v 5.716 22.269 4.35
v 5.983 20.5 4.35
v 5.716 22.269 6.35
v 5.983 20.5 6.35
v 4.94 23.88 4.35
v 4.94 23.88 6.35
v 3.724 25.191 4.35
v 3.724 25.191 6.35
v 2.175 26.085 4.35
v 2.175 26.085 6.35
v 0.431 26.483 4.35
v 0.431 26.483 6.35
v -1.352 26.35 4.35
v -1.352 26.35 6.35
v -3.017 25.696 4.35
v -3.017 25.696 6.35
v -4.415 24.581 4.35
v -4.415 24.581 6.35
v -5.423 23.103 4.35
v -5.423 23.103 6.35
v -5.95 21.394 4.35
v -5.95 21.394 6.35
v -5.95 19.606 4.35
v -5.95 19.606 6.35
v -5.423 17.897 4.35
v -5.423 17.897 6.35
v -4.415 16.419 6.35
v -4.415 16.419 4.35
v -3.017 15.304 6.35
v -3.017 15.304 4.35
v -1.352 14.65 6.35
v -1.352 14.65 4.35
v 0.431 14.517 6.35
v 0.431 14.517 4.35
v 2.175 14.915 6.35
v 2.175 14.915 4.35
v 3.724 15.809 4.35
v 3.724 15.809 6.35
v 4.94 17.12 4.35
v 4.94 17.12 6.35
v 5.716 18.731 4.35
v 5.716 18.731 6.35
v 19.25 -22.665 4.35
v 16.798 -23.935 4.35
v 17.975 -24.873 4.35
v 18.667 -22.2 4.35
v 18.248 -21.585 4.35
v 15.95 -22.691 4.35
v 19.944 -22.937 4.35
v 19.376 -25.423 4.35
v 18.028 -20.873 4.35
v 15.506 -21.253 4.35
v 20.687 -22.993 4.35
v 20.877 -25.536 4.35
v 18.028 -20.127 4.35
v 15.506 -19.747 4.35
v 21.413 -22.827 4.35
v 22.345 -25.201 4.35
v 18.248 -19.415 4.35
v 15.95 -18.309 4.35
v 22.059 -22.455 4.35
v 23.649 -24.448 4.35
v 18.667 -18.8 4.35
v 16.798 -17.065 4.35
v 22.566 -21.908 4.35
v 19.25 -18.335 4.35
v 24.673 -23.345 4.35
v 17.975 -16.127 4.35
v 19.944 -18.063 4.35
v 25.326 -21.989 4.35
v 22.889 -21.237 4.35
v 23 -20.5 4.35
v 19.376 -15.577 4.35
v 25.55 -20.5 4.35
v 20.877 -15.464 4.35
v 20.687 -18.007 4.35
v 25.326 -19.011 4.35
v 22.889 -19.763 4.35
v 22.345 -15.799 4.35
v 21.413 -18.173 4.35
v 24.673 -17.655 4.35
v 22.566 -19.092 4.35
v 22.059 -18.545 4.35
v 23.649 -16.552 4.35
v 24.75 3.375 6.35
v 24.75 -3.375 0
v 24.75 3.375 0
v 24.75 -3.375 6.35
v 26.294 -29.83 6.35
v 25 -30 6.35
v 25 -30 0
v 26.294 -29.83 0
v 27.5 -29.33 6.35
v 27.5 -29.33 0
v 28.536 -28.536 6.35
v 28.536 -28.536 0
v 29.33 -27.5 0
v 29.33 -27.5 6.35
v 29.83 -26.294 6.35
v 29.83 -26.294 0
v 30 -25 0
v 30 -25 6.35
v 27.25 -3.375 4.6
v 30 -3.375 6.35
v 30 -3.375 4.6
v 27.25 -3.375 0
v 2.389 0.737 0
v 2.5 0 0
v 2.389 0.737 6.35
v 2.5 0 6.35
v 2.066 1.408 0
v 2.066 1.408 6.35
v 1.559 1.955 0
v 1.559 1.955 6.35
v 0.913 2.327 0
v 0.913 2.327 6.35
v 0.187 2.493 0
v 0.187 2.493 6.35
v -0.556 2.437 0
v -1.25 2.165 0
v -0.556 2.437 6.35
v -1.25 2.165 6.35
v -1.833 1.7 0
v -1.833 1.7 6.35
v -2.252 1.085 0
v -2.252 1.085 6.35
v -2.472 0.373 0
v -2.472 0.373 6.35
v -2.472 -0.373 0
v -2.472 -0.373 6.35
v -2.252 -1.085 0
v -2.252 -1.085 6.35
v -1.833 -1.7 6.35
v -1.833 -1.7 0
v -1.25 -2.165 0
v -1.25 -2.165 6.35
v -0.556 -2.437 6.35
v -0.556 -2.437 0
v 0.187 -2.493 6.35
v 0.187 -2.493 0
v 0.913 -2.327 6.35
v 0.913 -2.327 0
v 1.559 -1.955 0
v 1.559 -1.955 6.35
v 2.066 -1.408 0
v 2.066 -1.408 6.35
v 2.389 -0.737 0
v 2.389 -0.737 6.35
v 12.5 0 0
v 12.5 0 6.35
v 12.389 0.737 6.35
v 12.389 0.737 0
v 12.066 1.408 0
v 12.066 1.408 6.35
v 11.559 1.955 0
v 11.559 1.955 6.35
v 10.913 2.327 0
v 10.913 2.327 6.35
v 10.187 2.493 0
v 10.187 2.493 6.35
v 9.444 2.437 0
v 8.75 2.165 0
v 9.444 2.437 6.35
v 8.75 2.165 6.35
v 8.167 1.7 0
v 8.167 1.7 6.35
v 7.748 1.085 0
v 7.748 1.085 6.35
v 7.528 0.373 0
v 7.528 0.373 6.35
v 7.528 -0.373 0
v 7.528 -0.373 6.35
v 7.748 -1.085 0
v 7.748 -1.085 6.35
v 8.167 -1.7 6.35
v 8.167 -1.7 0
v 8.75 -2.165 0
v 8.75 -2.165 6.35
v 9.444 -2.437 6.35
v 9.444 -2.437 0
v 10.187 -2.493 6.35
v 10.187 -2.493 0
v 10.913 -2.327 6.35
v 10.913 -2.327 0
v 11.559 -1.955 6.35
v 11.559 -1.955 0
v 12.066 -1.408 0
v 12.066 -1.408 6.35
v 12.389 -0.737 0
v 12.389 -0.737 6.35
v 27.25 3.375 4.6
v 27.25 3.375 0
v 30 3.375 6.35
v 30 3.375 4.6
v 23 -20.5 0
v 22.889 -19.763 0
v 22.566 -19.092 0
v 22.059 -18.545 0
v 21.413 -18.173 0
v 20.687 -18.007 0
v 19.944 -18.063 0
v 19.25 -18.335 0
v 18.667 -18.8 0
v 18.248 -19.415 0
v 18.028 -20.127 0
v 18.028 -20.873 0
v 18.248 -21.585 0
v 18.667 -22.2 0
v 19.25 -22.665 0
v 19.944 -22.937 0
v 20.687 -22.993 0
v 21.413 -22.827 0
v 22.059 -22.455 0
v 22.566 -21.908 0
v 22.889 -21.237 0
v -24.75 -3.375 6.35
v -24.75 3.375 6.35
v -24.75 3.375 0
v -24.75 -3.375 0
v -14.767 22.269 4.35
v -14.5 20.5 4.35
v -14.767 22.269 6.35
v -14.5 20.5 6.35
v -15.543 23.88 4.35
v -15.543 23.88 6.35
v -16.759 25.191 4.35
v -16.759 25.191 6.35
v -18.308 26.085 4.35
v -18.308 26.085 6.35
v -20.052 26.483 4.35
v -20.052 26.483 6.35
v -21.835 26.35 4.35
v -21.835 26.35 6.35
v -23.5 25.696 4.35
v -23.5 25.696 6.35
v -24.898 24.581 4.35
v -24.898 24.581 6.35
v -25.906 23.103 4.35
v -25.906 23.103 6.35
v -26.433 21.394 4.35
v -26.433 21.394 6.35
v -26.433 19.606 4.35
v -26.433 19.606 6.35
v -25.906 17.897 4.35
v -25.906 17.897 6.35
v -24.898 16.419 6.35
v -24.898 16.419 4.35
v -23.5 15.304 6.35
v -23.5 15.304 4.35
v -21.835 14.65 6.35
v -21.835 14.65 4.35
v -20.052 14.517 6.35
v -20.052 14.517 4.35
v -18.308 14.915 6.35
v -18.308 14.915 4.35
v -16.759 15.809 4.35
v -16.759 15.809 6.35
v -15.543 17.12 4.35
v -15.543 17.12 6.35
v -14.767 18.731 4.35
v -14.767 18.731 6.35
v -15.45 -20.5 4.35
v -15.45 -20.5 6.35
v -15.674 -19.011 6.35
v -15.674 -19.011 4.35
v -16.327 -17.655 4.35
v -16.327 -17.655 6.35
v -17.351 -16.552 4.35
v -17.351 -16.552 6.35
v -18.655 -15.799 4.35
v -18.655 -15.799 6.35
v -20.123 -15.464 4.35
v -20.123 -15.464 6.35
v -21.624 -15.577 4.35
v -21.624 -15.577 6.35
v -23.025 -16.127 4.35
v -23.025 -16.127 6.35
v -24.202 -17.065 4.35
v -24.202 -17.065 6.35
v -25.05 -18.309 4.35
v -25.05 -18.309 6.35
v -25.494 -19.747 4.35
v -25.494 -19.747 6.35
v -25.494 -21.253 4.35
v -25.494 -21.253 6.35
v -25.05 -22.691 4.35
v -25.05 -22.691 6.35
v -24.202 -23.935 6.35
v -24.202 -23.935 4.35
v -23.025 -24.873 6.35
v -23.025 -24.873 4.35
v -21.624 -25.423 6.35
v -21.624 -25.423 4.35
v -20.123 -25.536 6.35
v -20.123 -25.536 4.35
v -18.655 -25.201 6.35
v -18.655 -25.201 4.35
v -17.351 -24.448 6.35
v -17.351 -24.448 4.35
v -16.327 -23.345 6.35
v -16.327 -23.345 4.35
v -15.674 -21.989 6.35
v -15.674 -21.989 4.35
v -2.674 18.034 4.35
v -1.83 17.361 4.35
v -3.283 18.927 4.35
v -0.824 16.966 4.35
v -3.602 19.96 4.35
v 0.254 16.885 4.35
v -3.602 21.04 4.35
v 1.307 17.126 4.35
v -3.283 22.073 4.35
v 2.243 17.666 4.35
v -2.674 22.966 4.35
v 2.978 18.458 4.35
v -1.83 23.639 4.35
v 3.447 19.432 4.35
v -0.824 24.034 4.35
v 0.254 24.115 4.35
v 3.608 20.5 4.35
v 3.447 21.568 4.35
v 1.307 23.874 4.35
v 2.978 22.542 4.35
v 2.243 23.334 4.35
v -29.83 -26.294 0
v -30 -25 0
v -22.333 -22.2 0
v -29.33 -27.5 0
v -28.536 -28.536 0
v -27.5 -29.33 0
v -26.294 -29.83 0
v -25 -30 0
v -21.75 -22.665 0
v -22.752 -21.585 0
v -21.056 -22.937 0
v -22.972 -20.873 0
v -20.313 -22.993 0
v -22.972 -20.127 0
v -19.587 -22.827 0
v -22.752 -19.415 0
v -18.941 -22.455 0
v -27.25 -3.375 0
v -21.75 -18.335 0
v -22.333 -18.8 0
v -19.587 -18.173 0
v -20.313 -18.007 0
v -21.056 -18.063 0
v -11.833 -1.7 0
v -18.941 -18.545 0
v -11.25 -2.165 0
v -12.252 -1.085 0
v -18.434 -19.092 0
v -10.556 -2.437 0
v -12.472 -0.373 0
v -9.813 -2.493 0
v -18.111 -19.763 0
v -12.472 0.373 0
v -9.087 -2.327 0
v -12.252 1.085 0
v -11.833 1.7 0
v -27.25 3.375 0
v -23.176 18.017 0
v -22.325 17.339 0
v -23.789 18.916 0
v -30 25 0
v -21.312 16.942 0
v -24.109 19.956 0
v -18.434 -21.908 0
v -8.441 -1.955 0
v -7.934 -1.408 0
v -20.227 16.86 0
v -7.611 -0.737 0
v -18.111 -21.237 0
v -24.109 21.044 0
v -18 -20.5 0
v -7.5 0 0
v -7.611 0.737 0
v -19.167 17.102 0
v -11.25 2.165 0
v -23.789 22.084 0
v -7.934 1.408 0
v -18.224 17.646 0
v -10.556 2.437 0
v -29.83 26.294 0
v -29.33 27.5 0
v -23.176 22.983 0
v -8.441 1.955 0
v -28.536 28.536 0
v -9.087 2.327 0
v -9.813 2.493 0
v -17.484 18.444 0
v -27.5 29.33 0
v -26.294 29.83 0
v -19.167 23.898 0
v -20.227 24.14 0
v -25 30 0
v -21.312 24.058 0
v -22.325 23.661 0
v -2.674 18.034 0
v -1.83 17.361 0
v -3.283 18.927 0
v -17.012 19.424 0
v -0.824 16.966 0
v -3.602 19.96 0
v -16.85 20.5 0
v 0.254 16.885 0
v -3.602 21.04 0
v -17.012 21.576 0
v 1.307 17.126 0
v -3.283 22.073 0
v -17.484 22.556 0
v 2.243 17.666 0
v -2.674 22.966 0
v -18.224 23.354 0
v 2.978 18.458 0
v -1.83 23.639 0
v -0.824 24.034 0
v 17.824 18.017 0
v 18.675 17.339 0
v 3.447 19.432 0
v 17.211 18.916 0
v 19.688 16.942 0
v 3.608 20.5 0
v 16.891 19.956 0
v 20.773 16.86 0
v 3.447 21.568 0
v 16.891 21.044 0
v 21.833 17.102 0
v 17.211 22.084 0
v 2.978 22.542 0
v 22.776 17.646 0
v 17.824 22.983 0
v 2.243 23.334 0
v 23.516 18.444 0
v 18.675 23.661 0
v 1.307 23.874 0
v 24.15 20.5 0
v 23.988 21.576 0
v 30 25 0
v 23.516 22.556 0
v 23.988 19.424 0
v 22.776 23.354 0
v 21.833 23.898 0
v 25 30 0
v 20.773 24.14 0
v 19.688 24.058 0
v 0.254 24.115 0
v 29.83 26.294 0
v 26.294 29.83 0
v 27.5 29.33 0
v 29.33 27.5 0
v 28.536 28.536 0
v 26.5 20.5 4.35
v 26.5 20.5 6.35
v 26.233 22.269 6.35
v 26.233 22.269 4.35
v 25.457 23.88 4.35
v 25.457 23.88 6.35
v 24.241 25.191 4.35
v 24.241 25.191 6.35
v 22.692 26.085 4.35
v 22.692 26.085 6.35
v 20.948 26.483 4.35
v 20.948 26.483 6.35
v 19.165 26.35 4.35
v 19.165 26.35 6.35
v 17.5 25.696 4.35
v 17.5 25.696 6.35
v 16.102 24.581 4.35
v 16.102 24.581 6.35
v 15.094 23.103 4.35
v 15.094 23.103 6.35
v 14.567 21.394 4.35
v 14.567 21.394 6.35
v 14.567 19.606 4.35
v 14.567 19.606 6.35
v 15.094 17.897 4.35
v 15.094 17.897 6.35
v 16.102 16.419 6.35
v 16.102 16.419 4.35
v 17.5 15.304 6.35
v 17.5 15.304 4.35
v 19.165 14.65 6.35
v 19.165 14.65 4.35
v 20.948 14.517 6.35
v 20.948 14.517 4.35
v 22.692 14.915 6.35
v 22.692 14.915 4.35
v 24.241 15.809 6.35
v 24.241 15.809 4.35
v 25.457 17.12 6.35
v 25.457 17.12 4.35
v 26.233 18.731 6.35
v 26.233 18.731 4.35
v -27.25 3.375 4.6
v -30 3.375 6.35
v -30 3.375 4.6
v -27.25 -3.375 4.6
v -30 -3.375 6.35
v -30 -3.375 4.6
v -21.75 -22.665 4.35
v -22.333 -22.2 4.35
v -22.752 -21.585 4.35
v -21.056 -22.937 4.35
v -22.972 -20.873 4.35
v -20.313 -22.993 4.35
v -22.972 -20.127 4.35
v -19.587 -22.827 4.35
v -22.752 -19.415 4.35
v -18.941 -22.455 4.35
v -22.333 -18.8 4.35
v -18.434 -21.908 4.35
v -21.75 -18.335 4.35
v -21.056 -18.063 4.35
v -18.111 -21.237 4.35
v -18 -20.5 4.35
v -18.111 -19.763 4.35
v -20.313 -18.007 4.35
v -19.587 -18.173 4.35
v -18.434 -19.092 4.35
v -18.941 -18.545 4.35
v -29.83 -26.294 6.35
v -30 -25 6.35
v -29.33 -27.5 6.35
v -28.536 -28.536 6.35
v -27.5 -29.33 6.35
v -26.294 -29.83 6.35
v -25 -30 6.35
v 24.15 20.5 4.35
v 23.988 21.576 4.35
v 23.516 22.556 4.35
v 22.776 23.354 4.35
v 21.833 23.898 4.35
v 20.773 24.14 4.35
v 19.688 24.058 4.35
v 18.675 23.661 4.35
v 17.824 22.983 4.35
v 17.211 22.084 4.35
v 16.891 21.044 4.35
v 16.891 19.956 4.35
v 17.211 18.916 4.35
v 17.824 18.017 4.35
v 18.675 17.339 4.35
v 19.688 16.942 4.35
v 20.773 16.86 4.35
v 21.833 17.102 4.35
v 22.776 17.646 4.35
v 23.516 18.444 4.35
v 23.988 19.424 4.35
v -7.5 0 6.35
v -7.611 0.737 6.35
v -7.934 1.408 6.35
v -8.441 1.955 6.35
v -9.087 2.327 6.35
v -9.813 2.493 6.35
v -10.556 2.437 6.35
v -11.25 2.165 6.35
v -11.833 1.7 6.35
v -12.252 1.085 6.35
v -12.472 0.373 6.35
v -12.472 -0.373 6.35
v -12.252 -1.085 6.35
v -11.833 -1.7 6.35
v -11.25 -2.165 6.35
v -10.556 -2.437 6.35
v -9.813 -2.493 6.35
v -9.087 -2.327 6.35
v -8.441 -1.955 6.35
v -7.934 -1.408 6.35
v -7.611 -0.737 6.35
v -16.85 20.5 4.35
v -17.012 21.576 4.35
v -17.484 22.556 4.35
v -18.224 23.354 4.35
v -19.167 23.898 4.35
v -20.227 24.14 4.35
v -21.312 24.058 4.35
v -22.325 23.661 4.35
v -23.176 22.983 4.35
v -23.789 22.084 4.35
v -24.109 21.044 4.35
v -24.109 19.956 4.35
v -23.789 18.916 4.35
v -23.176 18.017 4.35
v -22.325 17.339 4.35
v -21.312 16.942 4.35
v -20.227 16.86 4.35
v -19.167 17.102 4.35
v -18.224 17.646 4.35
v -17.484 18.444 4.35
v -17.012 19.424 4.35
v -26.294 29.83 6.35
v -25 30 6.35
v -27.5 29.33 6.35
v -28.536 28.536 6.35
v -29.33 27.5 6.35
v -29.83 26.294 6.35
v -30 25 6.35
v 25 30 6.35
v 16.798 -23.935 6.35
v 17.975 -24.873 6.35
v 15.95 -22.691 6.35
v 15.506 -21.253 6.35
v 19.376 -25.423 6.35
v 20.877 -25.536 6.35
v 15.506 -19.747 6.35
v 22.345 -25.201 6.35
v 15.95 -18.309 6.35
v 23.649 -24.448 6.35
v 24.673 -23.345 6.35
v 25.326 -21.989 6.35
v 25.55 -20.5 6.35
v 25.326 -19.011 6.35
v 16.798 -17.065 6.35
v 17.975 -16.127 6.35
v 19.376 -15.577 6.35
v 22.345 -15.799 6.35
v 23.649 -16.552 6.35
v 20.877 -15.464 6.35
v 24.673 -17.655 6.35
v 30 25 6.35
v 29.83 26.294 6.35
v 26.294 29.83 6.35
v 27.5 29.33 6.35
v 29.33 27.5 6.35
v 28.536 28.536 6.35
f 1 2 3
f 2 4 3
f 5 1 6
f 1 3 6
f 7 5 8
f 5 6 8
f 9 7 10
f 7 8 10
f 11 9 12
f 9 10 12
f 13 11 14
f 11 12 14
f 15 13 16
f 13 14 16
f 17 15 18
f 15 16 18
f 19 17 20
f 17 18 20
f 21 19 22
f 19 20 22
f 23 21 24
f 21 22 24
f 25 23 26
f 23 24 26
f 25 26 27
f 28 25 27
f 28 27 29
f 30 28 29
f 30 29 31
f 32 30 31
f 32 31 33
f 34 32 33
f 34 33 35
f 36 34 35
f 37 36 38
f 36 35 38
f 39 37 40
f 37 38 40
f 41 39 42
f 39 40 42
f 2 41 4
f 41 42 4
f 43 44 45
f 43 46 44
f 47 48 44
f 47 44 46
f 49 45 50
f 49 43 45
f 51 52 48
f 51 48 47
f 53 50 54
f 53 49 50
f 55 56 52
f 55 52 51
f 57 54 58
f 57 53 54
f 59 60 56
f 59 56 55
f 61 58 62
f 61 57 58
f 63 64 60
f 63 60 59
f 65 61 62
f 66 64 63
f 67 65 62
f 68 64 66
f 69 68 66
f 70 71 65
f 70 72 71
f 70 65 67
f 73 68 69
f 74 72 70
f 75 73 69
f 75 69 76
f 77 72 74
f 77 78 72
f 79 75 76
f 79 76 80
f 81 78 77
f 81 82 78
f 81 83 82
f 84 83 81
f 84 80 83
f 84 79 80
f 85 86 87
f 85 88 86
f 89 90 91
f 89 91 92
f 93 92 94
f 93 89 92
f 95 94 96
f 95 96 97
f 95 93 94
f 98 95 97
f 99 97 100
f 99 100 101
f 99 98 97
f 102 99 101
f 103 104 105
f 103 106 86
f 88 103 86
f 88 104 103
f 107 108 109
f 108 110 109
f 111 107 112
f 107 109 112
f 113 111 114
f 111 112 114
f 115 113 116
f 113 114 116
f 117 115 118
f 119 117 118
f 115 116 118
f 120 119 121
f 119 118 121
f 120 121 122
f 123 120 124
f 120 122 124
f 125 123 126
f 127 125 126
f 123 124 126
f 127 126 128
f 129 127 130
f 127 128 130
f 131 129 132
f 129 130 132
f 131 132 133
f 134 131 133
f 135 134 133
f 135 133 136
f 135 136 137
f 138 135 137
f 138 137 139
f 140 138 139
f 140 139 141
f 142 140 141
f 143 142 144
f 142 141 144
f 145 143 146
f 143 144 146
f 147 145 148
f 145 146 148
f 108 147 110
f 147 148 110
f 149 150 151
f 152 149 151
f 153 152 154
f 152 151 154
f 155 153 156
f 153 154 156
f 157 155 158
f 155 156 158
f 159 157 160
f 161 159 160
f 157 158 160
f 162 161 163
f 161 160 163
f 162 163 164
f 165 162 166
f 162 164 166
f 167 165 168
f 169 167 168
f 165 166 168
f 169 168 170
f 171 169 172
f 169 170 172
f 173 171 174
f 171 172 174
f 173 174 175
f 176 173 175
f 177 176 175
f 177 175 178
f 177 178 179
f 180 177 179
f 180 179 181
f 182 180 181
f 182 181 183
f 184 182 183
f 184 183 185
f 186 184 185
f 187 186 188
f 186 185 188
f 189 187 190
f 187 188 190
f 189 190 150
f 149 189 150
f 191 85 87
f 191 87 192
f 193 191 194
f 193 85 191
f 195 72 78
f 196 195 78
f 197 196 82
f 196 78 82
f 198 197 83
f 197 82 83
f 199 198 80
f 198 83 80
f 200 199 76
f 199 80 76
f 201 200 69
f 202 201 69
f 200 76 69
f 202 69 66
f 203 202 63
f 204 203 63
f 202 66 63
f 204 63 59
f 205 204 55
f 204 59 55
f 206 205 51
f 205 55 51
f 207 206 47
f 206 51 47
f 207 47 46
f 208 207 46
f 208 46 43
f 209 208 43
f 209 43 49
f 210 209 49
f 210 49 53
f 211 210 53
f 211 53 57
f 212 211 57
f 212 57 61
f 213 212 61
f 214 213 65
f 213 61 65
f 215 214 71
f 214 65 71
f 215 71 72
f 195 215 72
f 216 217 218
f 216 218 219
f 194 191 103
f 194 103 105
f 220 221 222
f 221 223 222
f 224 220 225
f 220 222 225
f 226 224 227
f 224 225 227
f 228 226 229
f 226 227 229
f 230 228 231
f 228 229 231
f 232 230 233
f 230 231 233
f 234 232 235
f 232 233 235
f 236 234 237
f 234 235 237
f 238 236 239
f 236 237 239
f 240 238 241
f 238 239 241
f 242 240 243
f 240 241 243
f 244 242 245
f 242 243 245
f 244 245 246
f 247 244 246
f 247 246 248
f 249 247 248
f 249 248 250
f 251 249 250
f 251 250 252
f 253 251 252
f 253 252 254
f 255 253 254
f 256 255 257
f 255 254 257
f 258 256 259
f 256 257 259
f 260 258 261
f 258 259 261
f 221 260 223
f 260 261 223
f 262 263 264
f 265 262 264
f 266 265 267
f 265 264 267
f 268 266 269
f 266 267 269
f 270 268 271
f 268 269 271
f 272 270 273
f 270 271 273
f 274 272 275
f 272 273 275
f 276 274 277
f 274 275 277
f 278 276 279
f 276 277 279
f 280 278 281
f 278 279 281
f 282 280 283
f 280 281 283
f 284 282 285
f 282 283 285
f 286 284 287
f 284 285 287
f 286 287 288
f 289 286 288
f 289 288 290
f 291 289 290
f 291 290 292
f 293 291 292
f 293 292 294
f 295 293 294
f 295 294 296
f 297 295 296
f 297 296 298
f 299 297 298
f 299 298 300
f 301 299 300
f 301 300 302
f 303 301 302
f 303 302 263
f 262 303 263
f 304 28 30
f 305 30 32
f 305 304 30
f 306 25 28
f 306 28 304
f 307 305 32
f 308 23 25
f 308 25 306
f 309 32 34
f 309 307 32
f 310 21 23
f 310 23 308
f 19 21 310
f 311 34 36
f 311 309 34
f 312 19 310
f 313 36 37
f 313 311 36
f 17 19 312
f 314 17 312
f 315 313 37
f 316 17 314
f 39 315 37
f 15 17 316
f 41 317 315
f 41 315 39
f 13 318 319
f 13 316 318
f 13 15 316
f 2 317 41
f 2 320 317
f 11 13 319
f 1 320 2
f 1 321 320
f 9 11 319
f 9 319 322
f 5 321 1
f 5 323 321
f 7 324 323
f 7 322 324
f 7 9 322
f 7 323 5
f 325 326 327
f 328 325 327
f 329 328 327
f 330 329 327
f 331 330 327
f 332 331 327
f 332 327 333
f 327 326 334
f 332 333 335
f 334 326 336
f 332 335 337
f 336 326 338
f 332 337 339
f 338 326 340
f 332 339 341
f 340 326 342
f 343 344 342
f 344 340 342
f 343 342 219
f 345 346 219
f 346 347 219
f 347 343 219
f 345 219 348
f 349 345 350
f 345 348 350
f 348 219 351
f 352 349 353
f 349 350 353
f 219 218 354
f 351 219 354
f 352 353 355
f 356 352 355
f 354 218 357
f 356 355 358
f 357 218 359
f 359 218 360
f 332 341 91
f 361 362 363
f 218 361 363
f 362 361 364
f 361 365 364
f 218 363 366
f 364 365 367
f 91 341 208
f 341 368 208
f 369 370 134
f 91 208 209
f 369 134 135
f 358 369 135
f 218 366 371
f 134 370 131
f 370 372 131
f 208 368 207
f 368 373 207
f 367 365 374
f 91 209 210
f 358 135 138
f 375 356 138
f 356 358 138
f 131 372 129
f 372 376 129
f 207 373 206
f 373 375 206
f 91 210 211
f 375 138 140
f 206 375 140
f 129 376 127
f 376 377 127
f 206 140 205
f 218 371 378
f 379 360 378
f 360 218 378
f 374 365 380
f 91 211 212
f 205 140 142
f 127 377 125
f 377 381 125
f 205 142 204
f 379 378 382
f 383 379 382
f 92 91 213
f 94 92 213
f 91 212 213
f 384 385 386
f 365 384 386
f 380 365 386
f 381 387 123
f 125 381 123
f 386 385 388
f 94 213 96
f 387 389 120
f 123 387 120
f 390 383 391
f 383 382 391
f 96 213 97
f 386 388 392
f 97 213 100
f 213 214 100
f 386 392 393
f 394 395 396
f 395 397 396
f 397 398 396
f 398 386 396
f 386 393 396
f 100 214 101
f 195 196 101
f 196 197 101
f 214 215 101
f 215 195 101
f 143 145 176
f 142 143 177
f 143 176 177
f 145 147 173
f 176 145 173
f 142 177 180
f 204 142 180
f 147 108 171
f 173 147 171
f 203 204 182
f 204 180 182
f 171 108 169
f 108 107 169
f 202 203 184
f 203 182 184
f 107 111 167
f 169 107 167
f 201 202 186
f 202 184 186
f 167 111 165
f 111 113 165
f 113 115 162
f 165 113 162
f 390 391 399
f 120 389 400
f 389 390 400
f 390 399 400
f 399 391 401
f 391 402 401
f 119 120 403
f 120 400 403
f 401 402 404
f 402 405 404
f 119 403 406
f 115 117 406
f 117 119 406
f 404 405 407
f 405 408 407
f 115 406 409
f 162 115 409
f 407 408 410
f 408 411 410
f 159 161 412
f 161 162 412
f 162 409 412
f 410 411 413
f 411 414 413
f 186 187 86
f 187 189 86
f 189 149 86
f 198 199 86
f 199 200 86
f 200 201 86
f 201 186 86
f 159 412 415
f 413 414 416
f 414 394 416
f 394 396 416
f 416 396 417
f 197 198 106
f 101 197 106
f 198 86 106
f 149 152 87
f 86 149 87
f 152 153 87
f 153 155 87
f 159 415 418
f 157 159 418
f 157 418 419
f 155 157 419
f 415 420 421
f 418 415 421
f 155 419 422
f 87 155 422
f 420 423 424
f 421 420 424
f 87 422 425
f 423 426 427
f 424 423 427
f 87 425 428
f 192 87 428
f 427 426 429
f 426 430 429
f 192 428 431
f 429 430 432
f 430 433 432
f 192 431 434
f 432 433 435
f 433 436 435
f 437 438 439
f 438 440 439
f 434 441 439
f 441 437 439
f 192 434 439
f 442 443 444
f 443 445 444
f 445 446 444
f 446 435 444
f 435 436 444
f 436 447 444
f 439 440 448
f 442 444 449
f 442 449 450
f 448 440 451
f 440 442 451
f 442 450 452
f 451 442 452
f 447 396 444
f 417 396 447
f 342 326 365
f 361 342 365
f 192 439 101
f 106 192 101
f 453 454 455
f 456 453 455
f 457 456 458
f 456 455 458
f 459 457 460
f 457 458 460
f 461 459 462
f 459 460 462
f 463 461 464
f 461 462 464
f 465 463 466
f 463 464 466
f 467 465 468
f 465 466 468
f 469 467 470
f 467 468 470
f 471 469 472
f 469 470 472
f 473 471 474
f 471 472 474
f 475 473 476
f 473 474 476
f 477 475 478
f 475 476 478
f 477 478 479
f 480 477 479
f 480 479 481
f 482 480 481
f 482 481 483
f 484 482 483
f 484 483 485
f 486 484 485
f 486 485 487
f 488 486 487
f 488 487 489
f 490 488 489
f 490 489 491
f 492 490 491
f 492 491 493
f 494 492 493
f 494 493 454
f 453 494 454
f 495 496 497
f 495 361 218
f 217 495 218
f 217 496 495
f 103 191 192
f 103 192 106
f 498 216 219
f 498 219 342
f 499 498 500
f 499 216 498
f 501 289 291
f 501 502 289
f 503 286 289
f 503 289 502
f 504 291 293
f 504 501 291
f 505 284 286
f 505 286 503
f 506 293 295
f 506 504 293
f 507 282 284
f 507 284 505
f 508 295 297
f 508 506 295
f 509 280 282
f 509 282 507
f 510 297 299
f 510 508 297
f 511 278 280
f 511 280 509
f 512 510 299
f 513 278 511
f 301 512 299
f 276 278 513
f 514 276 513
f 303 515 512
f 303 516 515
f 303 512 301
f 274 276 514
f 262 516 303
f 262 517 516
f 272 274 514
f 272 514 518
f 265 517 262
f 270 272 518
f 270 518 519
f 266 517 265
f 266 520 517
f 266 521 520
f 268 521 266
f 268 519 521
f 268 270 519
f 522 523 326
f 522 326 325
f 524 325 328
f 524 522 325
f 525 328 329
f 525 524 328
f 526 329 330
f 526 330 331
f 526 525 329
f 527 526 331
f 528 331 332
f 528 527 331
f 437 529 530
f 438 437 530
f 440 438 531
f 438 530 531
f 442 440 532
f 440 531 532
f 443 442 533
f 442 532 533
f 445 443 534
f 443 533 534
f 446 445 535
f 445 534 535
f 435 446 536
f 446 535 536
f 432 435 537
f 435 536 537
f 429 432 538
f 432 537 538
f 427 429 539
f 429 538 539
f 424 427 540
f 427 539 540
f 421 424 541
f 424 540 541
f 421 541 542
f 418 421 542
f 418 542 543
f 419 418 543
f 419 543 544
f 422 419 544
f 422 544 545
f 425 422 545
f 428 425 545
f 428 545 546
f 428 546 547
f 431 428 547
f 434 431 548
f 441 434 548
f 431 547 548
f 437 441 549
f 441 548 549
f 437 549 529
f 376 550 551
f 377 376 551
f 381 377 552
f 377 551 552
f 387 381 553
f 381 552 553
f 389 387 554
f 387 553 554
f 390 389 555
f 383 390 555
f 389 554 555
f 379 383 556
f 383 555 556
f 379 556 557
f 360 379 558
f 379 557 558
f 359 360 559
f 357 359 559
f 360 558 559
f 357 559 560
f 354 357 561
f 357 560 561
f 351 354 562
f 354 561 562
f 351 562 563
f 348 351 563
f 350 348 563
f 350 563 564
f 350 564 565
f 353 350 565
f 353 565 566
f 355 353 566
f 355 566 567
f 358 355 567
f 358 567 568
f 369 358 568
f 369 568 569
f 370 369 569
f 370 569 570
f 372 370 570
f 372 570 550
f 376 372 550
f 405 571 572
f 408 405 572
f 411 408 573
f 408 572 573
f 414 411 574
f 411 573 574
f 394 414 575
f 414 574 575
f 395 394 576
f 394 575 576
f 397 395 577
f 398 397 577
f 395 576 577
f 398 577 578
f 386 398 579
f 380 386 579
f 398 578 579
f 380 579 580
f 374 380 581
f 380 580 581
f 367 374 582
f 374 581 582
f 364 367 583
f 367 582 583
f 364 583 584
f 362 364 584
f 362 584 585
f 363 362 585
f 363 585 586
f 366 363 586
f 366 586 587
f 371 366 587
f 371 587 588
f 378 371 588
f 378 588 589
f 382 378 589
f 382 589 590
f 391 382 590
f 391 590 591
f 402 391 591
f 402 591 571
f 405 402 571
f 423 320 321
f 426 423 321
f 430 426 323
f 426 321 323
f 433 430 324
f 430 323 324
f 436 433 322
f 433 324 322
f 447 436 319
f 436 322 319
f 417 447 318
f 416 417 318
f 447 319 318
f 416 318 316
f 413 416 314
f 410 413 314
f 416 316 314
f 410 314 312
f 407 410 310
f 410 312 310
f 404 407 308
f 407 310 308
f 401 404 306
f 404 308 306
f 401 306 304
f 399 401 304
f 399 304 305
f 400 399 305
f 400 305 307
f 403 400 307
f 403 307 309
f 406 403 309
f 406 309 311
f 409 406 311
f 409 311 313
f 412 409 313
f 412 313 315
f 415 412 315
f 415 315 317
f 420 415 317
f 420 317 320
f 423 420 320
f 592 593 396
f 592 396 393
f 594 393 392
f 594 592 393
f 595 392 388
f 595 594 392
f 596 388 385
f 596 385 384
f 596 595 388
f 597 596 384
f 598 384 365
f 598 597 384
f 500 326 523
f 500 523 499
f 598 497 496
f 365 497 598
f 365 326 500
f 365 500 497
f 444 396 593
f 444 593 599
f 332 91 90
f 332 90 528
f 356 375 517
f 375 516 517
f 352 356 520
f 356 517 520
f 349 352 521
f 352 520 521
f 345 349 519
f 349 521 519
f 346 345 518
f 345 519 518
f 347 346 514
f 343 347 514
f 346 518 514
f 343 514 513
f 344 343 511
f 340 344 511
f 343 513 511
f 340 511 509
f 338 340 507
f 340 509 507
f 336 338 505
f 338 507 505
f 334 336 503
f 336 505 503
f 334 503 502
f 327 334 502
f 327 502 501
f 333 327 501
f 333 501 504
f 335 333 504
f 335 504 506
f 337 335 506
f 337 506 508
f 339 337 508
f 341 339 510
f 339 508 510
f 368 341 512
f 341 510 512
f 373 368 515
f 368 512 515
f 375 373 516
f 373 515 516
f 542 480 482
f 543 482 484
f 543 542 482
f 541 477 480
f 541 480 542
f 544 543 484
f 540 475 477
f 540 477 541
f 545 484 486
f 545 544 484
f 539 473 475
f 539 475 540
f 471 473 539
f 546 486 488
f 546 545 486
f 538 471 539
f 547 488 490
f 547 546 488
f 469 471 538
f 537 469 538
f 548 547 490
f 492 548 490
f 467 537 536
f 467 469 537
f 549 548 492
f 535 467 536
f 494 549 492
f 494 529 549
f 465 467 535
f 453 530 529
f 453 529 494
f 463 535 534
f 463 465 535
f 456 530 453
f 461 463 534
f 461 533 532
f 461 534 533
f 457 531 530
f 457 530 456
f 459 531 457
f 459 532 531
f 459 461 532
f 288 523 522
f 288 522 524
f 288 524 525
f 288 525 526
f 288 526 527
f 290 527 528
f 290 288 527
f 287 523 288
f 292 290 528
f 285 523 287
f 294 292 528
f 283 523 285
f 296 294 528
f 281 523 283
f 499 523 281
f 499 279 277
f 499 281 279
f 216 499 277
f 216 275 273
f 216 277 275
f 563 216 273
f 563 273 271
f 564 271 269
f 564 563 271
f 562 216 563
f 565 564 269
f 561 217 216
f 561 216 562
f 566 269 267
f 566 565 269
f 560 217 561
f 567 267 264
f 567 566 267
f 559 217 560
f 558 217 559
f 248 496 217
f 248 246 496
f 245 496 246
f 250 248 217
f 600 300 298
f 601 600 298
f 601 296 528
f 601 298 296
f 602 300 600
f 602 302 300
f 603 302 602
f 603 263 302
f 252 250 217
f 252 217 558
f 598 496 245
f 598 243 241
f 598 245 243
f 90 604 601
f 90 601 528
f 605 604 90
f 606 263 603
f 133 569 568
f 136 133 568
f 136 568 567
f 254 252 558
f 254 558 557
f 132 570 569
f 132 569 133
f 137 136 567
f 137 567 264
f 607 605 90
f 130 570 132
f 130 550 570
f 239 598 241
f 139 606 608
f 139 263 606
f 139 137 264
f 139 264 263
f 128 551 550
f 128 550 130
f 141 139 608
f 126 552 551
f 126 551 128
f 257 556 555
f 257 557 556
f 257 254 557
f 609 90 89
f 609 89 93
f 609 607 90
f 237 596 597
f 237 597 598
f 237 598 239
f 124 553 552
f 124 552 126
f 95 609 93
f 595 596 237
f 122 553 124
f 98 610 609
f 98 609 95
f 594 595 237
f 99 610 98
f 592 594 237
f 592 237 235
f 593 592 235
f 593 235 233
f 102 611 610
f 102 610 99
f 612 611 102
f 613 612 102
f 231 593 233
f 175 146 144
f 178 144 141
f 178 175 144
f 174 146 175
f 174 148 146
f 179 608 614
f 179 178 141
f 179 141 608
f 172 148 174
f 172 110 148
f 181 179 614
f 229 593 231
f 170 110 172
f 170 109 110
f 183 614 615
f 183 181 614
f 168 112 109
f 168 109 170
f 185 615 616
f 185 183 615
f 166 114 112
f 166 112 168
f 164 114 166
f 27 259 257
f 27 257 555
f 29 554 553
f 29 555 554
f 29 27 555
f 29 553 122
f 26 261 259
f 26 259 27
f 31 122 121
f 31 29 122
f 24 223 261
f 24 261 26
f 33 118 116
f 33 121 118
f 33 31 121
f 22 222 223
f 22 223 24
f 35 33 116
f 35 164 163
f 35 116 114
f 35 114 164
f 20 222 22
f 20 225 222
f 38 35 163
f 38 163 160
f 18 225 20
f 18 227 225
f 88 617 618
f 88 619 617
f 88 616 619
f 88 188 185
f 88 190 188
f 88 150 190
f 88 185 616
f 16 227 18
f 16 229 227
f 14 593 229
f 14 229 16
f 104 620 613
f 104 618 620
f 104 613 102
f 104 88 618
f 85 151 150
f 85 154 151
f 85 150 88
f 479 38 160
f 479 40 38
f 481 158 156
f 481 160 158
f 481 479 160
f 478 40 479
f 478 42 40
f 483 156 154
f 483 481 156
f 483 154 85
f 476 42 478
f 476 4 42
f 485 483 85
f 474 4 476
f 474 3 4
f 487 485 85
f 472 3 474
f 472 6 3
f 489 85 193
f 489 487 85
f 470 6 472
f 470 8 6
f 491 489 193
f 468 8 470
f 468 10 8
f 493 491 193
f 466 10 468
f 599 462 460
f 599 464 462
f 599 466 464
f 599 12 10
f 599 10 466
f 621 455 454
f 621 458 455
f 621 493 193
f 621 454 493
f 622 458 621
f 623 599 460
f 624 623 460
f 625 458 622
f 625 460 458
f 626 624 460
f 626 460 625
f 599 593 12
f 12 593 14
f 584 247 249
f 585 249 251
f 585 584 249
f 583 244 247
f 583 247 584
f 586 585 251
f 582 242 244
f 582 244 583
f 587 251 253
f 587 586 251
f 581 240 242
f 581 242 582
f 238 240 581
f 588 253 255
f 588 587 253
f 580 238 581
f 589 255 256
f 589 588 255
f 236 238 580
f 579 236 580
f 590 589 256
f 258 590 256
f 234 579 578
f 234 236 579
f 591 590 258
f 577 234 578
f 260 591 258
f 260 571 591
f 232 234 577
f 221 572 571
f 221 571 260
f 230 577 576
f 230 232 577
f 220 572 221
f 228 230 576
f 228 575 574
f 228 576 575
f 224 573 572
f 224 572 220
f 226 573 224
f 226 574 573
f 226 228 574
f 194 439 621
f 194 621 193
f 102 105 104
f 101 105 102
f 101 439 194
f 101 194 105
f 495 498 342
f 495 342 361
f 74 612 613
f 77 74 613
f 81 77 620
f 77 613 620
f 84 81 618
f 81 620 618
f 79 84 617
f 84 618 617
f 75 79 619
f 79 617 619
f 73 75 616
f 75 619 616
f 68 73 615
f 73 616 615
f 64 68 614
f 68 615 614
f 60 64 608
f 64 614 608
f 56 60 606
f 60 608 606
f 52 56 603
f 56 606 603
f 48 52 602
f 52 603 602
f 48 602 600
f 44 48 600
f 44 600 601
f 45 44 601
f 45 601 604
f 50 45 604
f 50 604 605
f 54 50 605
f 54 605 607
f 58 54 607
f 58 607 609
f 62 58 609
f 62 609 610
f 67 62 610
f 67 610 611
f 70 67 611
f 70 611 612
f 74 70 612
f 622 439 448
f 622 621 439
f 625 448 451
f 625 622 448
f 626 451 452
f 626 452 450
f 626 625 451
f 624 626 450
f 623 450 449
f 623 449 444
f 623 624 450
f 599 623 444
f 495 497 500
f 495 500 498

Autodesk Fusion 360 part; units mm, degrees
sketch "Sketch1" plane through (0, 0, 0) normal (0, 0, 1) x (1, 0, 0)
  line L0 (30, -30) -> (-30, -30)
  line L1 (-30, -30) -> (-30, 30)
  line L2 (-30, 30) -> (30, 30)
  line L3 (30, 30) -> (30, -30)
  line L4 (30, -30) -> (-30, 30) construction
  line L5 (-30, -30) -> (30, 30) construction
  dimension "d1" = 60
  dimension "d2" = 60
extrude "Extrude1" add sketch "Sketch1" along normal blind 6.35
sketch "Sketch2" plane through (0, 0, 6.35) normal (0, 0, 1) x (1, 0, 0)
  line L0 (30, 30) -> (-30, 30)
  line L1 (-30, 30) -> (-30, -30)
  line L2 (-30, -30) -> (30, -30)
  line L3 (30, -30) -> (30, 30)
  line L4 (20.5, -20.5) -> (-20.5, -20.5)
  line L5 (-20.5, -20.5) -> (-20.5, 20.5)
  line L6 (-20.5, 20.5) -> (20.5, 20.5)
  line L7 (20.5, 20.5) -> (20.5, -20.5)
  line L8 (20.5, -20.5) -> (-20.5, 20.5) construction
  line L9 (-20.5, -20.5) -> (20.5, 20.5) construction
  circle A0 centre (-20.5, 20.5) radius 3.575
  circle A1 centre (20.5, 20.5) radius 3.575
  circle A2 centre (20.5, -20.5) radius 2.5
  circle A3 centre (-20.5, -20.5) radius 2.5
  dimension "d5" = 41
  dimension "d6" = 41
  dimension "d7" = 7.15
  dimension "d8" = 7.15
  dimension "d9" = 5
  dimension "d10" = 5
extrude "Extrude2" cut sketch "Sketch2" against normal through all contours L4 L5 A3 | L4 L5 A3 | L4 L7 A2 | L4 L7 A2 | L5 L6 A0 | L5 L6 A0 | L6 L7 A1 | L6 L7 A1
sketch "Sketch3" plane through (0, 0, 6.35) normal (0, 0, 1) x (1, 0, 0)
  circle A0 centre (-20.5, -20.5) radius 2.5
  circle A1 centre (-20.5, 20.5) radius 3.575
  circle A2 centre (20.5, -20.5) radius 2.5
  circle A3 centre (20.5, 20.5) radius 3.575
  line L0 (30, 30) -> (-30, 30)
  line L1 (-30, 30) -> (-30, -30)
  line L2 (-30, -30) -> (30, -30)
  line L3 (30, -30) -> (30, 30)
  circle A4 centre (-20.5, -20.5) radius 5.05
  circle A5 centre (20.5, -20.5) radius 5.05
  circle A6 centre (20.5, 20.5) radius 5.05
  circle A7 centre (-20.5, 20.5) radius 5.05
  dimension "d12" = 10.1
  dimension "d13" = 10.1
  dimension "d14" = 10.1
  dimension "d15" = 10.1
extrude "Extrude3" cut sketch "Sketch3" against normal blind 2 contours A4 | A5 | A6 | A7
fillet "Fillet1" radius 5 2 edges at (30, -30, 3.175) (30, 30, 3.175)
fillet "Fillet2" radius 5 2 edges at (-30, 30, 3.175) (-30, -30, 3.175)
sketch "Sketch4" plane through (0, 0, 6.35) normal (0, 0, 1) x (1, 0, 0)
  arc A0 (-30, -25) -> (-25, -30) centre (-25, -25) ccw
  line L0 (-25, -30) -> (25, -30)
  arc A1 (25, -30) -> (30, -25) centre (25, -25) ccw
  line L1 (30, -25) -> (30, 25)
  arc A2 (30, 25) -> (25, 30) centre (25, 25) ccw
  line L2 (25, 30) -> (-25, 30)
  arc A3 (-25, 30) -> (-30, 25) centre (-25, 25) ccw
  line L3 (-30, 25) -> (-30, -25)
  circle A4 centre (20.5, 20.5) radius 5.05
  circle A5 centre (20.5, -20.5) radius 5.05
  circle A6 centre (-20.5, 20.5) radius 5.05
  circle A7 centre (-20.5, -20.5) radius 5.05
  circle A8 centre (0, 0) radius 2.5
  circle A9 centre (10, 0) radius 2.5
  circle A10 centre (-10, 0) radius 2.5
  line L4 (-25.75, -3.375) -> (-28.25, -3.375)
  line L5 (-28.25, -3.375) -> (-28.25, 3.375)
  line L6 (-28.25, 3.375) -> (-25.75, 3.375)
  line L7 (-25.75, 3.375) -> (-25.75, -3.375)
  line L8 (-25.75, -3.375) -> (-28.25, 3.375) construction
  line L9 (-28.25, -3.375) -> (-25.75, 3.375) construction
  line L10 (28.25, -3.375) -> (25.75, -3.375)
  line L11 (25.75, -3.375) -> (25.75, 3.375)
  line L12 (25.75, 3.375) -> (28.25, 3.375)
  line L13 (28.25, 3.375) -> (28.25, -3.375)
  line L14 (28.25, -3.375) -> (25.75, 3.375) construction
  line L15 (25.75, -3.375) -> (28.25, 3.375) construction
  point P0 (-27, 0)
  point P1 (27, 0)
  dimension "d20" = 5
  dimension "d21" = 5
  dimension "d22" = 5
  dimension "d23" = 6.75
  dimension "d24" = 2.5
  dimension "d25" = 6.75
  dimension "d26" = 2.5
extrude "Extrude4" cut sketch "Sketch4" against normal through all contours A8 | A9 | A10 | L4 L5 L6 L7 | L10 L11 L12 L13
sketch "Sketch5" plane through (0, 0, 6.35) normal (0, 0, 1) x (1, 0, 0)
  circle A0 centre (0, 0) radius 2.5
  circle A1 centre (-10, 0) radius 2.5
  circle A2 centre (10, 0) radius 2.5
  line L0 (-25.75, 3.375) -> (-25.75, -3.375)
  line L1 (-25.75, -3.375) -> (-28.25, -3.375)
  line L2 (-28.25, -3.375) -> (-28.25, 3.375)
  line L3 (-28.25, 3.375) -> (-25.75, 3.375)
  line L4 (28.25, 3.375) -> (28.25, -3.375)
  line L5 (28.25, -3.375) -> (25.75, -3.375)
  line L6 (25.75, -3.375) -> (25.75, 3.375)
  line L7 (25.75, 3.375) -> (28.25, 3.375)
  arc A3 (-30, -25) -> (-25, -30) centre (-25, -25) ccw
  line L8 (-25, -30) -> (25, -30)
  arc A4 (25, -30) -> (30, -25) centre (25, -25) ccw
  line L9 (30, -25) -> (30, 25)
  arc A5 (30, 25) -> (25, 30) centre (25, 25) ccw
  line L10 (25, 30) -> (-25, 30)
  arc A6 (-25, 30) -> (-30, 25) centre (-25, 25) ccw
  line L11 (-30, 25) -> (-30, -25)
  circle A7 centre (20.5, 20.5) radius 5.05
  circle A8 centre (20.5, -20.5) radius 5.05
  circle A9 centre (-20.5, 20.5) radius 5.05
  circle A10 centre (-20.5, -20.5) radius 5.05
  circle A11 centre (-20.5, 20.5) radius 6
  circle A12 centre (20.5, 20.5) radius 6
  dimension "d28" = 12
  dimension "d29" = 12
extrude "Extrude5" cut sketch "Sketch5" against normal blind 2 contours A11 | A12
sketch "Sketch6" plane through (0, 0, 6.35) normal (0, 0, 1) x (1, 0, 0)
  circle A0 centre (-20.5, 20.5) radius 6
  circle A1 centre (20.5, 20.5) radius 6
  circle A2 centre (0, 0) radius 2.5
  circle A3 centre (-10, 0) radius 2.5
  circle A4 centre (10, 0) radius 2.5
  line L0 (-25.75, 3.375) -> (-25.75, -3.375)
  line L1 (-25.75, -3.375) -> (-28.25, -3.375)
  line L2 (-28.25, -3.375) -> (-28.25, 3.375)
  line L3 (-28.25, 3.375) -> (-25.75, 3.375)
  line L4 (28.25, 3.375) -> (28.25, -3.375)
  line L5 (28.25, -3.375) -> (25.75, -3.375)
  line L6 (25.75, -3.375) -> (25.75, 3.375)
  line L7 (25.75, 3.375) -> (28.25, 3.375)
  arc A5 (-30, -25) -> (-25, -30) centre (-25, -25) ccw
  line L8 (-25, -30) -> (25, -30)
  arc A6 (25, -30) -> (30, -25) centre (25, -25) ccw
  line L9 (30, -25) -> (30, 25)
  arc A7 (30, 25) -> (25, 30) centre (25, 25) ccw
  line L10 (25, 30) -> (-25, 30)
  arc A8 (-25, 30) -> (-30, 25) centre (-25, 25) ccw
  line L11 (-30, 25) -> (-30, -25)
  circle A9 centre (20.5, -20.5) radius 5.05
  circle A10 centre (-20.5, -20.5) radius 5.05
  circle A11 centre (-20.5, 20.5) radius 3.65
  circle A12 centre (20.5, 20.5) radius 3.65
  dimension "d32" = 7.3
  dimension "d33" = 7.3
extrude "Extrude6" cut sketch "Sketch6" against normal through all contours A11
sketch "Sketch7" plane through (0, 0, 4.35) normal (0, 0, 1) x (1, 0, 0)
  circle A0 centre (20.5, 20.5) radius 6
  circle A1 centre (20.5, 20.5) radius 3.575
  circle A2 centre (20.5, 20.5) radius 3.65
  dimension "d35" = 7.3
extrude "Extrude7" cut sketch "Sketch7" against normal through all contours A2
move_face "OffsetFaces1" offset -1 1 faces at (-25.75, 1.125, 4.2333)
move_face "OffsetFaces2" offset 1 1 faces at (28.25, -1.125, 2.1167)
move_face "OffsetFaces3" offset 1 1 faces at (-28.25, 1.125, 2.1167)
move_face "OffsetFaces4" offset -1 1 faces at (25.75, 1.125, 2.1167)
sketch "Sketch9" plane through (0, 0, 6.35) normal (0, 0, 1) x (1, 0, 0)
  circle A0 centre (-20.5, 20.5) radius 6
  circle A1 centre (20.5, 20.5) radius 6
  circle A2 centre (0, 0) radius 2.5
  circle A3 centre (-10, 0) radius 2.5
  circle A4 centre (10, 0) radius 2.5
  line L0 (-24.75, 3.375) -> (-24.75, -3.375)
  line L1 (-24.75, -3.375) -> (-27.25, -3.375)
  line L2 (-27.25, -3.375) -> (-27.25, 3.375)
  line L3 (-27.25, 3.375) -> (-24.75, 3.375)
  line L4 (27.25, 3.375) -> (27.25, -3.375)
  line L5 (27.25, -3.375) -> (24.75, -3.375)
  line L6 (24.75, -3.375) -> (24.75, 3.375)
  line L7 (24.75, 3.375) -> (27.25, 3.375)
  arc A5 (-30, -25) -> (-25, -30) centre (-25, -25) ccw
  line L8 (-25, -30) -> (25, -30)
  arc A6 (25, -30) -> (30, -25) centre (25, -25) ccw
  line L9 (30, -25) -> (30, 25)
  arc A7 (30, 25) -> (25, 30) centre (25, 25) ccw
  line L10 (25, 30) -> (-25, 30)
  arc A8 (-25, 30) -> (-30, 25) centre (-25, 25) ccw
  line L11 (-30, 25) -> (-30, -25)
  circle A9 centre (20.5, -20.5) radius 5.05
  circle A10 centre (-20.5, -20.5) radius 5.05
  line L12 (-27.25, 3.375) -> (-30, 3.375)
  line L13 (-30, 3.375) -> (-30, -3.375)
  line L14 (-30, -3.375) -> (-27.25, -3.375)
  line L15 (-27.25, -3.375) -> (-27.25, 3.375)
  circle A11 centre (-0.0171, 20.5) radius 3.625
  dimension "d48" = 6.75
  dimension "d51" = 7.25
extrude "Extrude9" cut sketch "Sketch9" against normal blind 1.75 contours L2 L11 L12 L13 L14 L15
sketch "Sketch10" plane through (0, 0, 6.35) normal (0, 0, 1) x (1, 0, 0)
  line L0 (-30, -3.375) -> (-30, -25)
  arc A0 (-30, -25) -> (-25, -30) centre (-25, -25) ccw
  line L1 (-25, -30) -> (25, -30)
  arc A1 (25, -30) -> (30, -25) centre (25, -25) ccw
  line L2 (30, -25) -> (30, 25)
  arc A2 (30, 25) -> (25, 30) centre (25, 25) ccw
  line L3 (25, 30) -> (-25, 30)
  arc A3 (-25, 30) -> (-30, 25) centre (-25, 25) ccw
  line L4 (-30, 25) -> (-30, 3.375)
  line L5 (-30, 3.375) -> (-24.75, 3.375)
  line L6 (-24.75, 3.375) -> (-24.75, -3.375)
  line L7 (-24.75, -3.375) -> (-30, -3.375)
  circle A4 centre (-20.5, 20.5) radius 6
  circle A5 centre (20.5, 20.5) radius 6
  circle A6 centre (0, 0) radius 2.5
  circle A7 centre (-10, 0) radius 2.5
  circle A8 centre (10, 0) radius 2.5
  line L8 (27.25, 3.375) -> (27.25, -3.375)
  line L9 (27.25, -3.375) -> (24.75, -3.375)
  line L10 (24.75, -3.375) -> (24.75, 3.375)
  line L11 (24.75, 3.375) -> (27.25, 3.375)
  circle A9 centre (20.5, -20.5) radius 5.05
  circle A10 centre (-20.5, -20.5) radius 5.05
  line L12 (27.25, 3.375) -> (30, 3.375)
  line L13 (30, 3.375) -> (30, -3.375)
  line L14 (30, -3.375) -> (27.25, -3.375)
  line L15 (27.25, -3.375) -> (27.25, 3.375)
  dimension "d45" = 6.75
extrude "Extrude10" cut sketch "Sketch10" against normal blind 1.75 contours L2 L8 L12 L13 L14 L15
extrude "Extrude11" cut sketch "Sketch9" against normal blind 1.75 contours L2 L11 L12 L13 L14 L15
extrude "Extrude12" cut sketch "Sketch9" against normal through all contours A11
sketch "Sketch11" plane through (0, 0, 6.35) normal (0, 0, 1) x (1, 0, 0)
  circle A0 centre (-0.0171, 20.5) radius 3.625
  line L0 (30, -3.375) -> (24.75, -3.375)
  line L1 (24.75, -3.375) -> (24.75, 3.375)
  line L2 (24.75, 3.375) -> (30, 3.375)
  line L3 (30, 3.375) -> (30, 25)
  arc A1 (30, 25) -> (25, 30) centre (25, 25) ccw
  line L4 (25, 30) -> (-25, 30)
  arc A2 (-25, 30) -> (-30, 25) centre (-25, 25) ccw
  line L5 (-30, 25) -> (-30, 3.375)
  line L6 (-30, 3.375) -> (-24.75, 3.375)
  line L7 (-24.75, 3.375) -> (-24.75, -3.375)
  line L8 (-24.75, -3.375) -> (-30, -3.375)
  line L9 (-30, -3.375) -> (-30, -25)
  arc A3 (-30, -25) -> (-25, -30) centre (-25, -25) ccw
  line L10 (-25, -30) -> (25, -30)
  arc A4 (25, -30) -> (30, -25) centre (25, -25) ccw
  line L11 (30, -25) -> (30, -3.375)
  circle A5 centre (-20.5, -20.5) radius 5.05
  circle A6 centre (20.5, -20.5) radius 5.05
  circle A7 centre (10, 0) radius 2.5
  circle A8 centre (-10, 0) radius 2.5
  circle A9 centre (0, 0) radius 2.5
  circle A10 centre (20.5, 20.5) radius 6
  circle A11 centre (-20.5, 20.5) radius 6
  circle A12 centre (-0.0171, 20.5) radius 6
  dimension "d53" = 12
extrude "Extrude13" cut sketch "Sketch11" against normal blind 2 contours A12
sketch "Sketch12" plane through (0, 0, 6.35) normal (0, 0, 1) x (1, 0, 0)
  circle A0 centre (-0.0171, 20.5) radius 6
  line L0 (30, -3.375) -> (24.75, -3.375)
  line L1 (24.75, -3.375) -> (24.75, 3.375)
  line L2 (24.75, 3.375) -> (30, 3.375)
  line L3 (30, 3.375) -> (30, 25)
  arc A1 (30, 25) -> (25, 30) centre (25, 25) ccw
  line L4 (25, 30) -> (-25, 30)
  arc A2 (-25, 30) -> (-30, 25) centre (-25, 25) ccw
  line L5 (-30, 25) -> (-30, 3.375)
  line L6 (-30, 3.375) -> (-24.75, 3.375)
  line L7 (-24.75, 3.375) -> (-24.75, -3.375)
  line L8 (-24.75, -3.375) -> (-30, -3.375)
  line L9 (-30, -3.375) -> (-30, -25)
  arc A3 (-30, -25) -> (-25, -30) centre (-25, -25) ccw
  line L10 (-25, -30) -> (25, -30)
  arc A4 (25, -30) -> (30, -25) centre (25, -25) ccw
  line L11 (30, -25) -> (30, -3.375)
  circle A5 centre (-20.5, -20.5) radius 5.05
  circle A6 centre (20.5, -20.5) radius 5.05
  circle A7 centre (10, 0) radius 2.5
  circle A8 centre (-10, 0) radius 2.5
  circle A9 centre (0, 0) radius 2.5
  circle A10 centre (20.5, 20.5) radius 6
  circle A11 centre (-20.5, 20.5) radius 6
